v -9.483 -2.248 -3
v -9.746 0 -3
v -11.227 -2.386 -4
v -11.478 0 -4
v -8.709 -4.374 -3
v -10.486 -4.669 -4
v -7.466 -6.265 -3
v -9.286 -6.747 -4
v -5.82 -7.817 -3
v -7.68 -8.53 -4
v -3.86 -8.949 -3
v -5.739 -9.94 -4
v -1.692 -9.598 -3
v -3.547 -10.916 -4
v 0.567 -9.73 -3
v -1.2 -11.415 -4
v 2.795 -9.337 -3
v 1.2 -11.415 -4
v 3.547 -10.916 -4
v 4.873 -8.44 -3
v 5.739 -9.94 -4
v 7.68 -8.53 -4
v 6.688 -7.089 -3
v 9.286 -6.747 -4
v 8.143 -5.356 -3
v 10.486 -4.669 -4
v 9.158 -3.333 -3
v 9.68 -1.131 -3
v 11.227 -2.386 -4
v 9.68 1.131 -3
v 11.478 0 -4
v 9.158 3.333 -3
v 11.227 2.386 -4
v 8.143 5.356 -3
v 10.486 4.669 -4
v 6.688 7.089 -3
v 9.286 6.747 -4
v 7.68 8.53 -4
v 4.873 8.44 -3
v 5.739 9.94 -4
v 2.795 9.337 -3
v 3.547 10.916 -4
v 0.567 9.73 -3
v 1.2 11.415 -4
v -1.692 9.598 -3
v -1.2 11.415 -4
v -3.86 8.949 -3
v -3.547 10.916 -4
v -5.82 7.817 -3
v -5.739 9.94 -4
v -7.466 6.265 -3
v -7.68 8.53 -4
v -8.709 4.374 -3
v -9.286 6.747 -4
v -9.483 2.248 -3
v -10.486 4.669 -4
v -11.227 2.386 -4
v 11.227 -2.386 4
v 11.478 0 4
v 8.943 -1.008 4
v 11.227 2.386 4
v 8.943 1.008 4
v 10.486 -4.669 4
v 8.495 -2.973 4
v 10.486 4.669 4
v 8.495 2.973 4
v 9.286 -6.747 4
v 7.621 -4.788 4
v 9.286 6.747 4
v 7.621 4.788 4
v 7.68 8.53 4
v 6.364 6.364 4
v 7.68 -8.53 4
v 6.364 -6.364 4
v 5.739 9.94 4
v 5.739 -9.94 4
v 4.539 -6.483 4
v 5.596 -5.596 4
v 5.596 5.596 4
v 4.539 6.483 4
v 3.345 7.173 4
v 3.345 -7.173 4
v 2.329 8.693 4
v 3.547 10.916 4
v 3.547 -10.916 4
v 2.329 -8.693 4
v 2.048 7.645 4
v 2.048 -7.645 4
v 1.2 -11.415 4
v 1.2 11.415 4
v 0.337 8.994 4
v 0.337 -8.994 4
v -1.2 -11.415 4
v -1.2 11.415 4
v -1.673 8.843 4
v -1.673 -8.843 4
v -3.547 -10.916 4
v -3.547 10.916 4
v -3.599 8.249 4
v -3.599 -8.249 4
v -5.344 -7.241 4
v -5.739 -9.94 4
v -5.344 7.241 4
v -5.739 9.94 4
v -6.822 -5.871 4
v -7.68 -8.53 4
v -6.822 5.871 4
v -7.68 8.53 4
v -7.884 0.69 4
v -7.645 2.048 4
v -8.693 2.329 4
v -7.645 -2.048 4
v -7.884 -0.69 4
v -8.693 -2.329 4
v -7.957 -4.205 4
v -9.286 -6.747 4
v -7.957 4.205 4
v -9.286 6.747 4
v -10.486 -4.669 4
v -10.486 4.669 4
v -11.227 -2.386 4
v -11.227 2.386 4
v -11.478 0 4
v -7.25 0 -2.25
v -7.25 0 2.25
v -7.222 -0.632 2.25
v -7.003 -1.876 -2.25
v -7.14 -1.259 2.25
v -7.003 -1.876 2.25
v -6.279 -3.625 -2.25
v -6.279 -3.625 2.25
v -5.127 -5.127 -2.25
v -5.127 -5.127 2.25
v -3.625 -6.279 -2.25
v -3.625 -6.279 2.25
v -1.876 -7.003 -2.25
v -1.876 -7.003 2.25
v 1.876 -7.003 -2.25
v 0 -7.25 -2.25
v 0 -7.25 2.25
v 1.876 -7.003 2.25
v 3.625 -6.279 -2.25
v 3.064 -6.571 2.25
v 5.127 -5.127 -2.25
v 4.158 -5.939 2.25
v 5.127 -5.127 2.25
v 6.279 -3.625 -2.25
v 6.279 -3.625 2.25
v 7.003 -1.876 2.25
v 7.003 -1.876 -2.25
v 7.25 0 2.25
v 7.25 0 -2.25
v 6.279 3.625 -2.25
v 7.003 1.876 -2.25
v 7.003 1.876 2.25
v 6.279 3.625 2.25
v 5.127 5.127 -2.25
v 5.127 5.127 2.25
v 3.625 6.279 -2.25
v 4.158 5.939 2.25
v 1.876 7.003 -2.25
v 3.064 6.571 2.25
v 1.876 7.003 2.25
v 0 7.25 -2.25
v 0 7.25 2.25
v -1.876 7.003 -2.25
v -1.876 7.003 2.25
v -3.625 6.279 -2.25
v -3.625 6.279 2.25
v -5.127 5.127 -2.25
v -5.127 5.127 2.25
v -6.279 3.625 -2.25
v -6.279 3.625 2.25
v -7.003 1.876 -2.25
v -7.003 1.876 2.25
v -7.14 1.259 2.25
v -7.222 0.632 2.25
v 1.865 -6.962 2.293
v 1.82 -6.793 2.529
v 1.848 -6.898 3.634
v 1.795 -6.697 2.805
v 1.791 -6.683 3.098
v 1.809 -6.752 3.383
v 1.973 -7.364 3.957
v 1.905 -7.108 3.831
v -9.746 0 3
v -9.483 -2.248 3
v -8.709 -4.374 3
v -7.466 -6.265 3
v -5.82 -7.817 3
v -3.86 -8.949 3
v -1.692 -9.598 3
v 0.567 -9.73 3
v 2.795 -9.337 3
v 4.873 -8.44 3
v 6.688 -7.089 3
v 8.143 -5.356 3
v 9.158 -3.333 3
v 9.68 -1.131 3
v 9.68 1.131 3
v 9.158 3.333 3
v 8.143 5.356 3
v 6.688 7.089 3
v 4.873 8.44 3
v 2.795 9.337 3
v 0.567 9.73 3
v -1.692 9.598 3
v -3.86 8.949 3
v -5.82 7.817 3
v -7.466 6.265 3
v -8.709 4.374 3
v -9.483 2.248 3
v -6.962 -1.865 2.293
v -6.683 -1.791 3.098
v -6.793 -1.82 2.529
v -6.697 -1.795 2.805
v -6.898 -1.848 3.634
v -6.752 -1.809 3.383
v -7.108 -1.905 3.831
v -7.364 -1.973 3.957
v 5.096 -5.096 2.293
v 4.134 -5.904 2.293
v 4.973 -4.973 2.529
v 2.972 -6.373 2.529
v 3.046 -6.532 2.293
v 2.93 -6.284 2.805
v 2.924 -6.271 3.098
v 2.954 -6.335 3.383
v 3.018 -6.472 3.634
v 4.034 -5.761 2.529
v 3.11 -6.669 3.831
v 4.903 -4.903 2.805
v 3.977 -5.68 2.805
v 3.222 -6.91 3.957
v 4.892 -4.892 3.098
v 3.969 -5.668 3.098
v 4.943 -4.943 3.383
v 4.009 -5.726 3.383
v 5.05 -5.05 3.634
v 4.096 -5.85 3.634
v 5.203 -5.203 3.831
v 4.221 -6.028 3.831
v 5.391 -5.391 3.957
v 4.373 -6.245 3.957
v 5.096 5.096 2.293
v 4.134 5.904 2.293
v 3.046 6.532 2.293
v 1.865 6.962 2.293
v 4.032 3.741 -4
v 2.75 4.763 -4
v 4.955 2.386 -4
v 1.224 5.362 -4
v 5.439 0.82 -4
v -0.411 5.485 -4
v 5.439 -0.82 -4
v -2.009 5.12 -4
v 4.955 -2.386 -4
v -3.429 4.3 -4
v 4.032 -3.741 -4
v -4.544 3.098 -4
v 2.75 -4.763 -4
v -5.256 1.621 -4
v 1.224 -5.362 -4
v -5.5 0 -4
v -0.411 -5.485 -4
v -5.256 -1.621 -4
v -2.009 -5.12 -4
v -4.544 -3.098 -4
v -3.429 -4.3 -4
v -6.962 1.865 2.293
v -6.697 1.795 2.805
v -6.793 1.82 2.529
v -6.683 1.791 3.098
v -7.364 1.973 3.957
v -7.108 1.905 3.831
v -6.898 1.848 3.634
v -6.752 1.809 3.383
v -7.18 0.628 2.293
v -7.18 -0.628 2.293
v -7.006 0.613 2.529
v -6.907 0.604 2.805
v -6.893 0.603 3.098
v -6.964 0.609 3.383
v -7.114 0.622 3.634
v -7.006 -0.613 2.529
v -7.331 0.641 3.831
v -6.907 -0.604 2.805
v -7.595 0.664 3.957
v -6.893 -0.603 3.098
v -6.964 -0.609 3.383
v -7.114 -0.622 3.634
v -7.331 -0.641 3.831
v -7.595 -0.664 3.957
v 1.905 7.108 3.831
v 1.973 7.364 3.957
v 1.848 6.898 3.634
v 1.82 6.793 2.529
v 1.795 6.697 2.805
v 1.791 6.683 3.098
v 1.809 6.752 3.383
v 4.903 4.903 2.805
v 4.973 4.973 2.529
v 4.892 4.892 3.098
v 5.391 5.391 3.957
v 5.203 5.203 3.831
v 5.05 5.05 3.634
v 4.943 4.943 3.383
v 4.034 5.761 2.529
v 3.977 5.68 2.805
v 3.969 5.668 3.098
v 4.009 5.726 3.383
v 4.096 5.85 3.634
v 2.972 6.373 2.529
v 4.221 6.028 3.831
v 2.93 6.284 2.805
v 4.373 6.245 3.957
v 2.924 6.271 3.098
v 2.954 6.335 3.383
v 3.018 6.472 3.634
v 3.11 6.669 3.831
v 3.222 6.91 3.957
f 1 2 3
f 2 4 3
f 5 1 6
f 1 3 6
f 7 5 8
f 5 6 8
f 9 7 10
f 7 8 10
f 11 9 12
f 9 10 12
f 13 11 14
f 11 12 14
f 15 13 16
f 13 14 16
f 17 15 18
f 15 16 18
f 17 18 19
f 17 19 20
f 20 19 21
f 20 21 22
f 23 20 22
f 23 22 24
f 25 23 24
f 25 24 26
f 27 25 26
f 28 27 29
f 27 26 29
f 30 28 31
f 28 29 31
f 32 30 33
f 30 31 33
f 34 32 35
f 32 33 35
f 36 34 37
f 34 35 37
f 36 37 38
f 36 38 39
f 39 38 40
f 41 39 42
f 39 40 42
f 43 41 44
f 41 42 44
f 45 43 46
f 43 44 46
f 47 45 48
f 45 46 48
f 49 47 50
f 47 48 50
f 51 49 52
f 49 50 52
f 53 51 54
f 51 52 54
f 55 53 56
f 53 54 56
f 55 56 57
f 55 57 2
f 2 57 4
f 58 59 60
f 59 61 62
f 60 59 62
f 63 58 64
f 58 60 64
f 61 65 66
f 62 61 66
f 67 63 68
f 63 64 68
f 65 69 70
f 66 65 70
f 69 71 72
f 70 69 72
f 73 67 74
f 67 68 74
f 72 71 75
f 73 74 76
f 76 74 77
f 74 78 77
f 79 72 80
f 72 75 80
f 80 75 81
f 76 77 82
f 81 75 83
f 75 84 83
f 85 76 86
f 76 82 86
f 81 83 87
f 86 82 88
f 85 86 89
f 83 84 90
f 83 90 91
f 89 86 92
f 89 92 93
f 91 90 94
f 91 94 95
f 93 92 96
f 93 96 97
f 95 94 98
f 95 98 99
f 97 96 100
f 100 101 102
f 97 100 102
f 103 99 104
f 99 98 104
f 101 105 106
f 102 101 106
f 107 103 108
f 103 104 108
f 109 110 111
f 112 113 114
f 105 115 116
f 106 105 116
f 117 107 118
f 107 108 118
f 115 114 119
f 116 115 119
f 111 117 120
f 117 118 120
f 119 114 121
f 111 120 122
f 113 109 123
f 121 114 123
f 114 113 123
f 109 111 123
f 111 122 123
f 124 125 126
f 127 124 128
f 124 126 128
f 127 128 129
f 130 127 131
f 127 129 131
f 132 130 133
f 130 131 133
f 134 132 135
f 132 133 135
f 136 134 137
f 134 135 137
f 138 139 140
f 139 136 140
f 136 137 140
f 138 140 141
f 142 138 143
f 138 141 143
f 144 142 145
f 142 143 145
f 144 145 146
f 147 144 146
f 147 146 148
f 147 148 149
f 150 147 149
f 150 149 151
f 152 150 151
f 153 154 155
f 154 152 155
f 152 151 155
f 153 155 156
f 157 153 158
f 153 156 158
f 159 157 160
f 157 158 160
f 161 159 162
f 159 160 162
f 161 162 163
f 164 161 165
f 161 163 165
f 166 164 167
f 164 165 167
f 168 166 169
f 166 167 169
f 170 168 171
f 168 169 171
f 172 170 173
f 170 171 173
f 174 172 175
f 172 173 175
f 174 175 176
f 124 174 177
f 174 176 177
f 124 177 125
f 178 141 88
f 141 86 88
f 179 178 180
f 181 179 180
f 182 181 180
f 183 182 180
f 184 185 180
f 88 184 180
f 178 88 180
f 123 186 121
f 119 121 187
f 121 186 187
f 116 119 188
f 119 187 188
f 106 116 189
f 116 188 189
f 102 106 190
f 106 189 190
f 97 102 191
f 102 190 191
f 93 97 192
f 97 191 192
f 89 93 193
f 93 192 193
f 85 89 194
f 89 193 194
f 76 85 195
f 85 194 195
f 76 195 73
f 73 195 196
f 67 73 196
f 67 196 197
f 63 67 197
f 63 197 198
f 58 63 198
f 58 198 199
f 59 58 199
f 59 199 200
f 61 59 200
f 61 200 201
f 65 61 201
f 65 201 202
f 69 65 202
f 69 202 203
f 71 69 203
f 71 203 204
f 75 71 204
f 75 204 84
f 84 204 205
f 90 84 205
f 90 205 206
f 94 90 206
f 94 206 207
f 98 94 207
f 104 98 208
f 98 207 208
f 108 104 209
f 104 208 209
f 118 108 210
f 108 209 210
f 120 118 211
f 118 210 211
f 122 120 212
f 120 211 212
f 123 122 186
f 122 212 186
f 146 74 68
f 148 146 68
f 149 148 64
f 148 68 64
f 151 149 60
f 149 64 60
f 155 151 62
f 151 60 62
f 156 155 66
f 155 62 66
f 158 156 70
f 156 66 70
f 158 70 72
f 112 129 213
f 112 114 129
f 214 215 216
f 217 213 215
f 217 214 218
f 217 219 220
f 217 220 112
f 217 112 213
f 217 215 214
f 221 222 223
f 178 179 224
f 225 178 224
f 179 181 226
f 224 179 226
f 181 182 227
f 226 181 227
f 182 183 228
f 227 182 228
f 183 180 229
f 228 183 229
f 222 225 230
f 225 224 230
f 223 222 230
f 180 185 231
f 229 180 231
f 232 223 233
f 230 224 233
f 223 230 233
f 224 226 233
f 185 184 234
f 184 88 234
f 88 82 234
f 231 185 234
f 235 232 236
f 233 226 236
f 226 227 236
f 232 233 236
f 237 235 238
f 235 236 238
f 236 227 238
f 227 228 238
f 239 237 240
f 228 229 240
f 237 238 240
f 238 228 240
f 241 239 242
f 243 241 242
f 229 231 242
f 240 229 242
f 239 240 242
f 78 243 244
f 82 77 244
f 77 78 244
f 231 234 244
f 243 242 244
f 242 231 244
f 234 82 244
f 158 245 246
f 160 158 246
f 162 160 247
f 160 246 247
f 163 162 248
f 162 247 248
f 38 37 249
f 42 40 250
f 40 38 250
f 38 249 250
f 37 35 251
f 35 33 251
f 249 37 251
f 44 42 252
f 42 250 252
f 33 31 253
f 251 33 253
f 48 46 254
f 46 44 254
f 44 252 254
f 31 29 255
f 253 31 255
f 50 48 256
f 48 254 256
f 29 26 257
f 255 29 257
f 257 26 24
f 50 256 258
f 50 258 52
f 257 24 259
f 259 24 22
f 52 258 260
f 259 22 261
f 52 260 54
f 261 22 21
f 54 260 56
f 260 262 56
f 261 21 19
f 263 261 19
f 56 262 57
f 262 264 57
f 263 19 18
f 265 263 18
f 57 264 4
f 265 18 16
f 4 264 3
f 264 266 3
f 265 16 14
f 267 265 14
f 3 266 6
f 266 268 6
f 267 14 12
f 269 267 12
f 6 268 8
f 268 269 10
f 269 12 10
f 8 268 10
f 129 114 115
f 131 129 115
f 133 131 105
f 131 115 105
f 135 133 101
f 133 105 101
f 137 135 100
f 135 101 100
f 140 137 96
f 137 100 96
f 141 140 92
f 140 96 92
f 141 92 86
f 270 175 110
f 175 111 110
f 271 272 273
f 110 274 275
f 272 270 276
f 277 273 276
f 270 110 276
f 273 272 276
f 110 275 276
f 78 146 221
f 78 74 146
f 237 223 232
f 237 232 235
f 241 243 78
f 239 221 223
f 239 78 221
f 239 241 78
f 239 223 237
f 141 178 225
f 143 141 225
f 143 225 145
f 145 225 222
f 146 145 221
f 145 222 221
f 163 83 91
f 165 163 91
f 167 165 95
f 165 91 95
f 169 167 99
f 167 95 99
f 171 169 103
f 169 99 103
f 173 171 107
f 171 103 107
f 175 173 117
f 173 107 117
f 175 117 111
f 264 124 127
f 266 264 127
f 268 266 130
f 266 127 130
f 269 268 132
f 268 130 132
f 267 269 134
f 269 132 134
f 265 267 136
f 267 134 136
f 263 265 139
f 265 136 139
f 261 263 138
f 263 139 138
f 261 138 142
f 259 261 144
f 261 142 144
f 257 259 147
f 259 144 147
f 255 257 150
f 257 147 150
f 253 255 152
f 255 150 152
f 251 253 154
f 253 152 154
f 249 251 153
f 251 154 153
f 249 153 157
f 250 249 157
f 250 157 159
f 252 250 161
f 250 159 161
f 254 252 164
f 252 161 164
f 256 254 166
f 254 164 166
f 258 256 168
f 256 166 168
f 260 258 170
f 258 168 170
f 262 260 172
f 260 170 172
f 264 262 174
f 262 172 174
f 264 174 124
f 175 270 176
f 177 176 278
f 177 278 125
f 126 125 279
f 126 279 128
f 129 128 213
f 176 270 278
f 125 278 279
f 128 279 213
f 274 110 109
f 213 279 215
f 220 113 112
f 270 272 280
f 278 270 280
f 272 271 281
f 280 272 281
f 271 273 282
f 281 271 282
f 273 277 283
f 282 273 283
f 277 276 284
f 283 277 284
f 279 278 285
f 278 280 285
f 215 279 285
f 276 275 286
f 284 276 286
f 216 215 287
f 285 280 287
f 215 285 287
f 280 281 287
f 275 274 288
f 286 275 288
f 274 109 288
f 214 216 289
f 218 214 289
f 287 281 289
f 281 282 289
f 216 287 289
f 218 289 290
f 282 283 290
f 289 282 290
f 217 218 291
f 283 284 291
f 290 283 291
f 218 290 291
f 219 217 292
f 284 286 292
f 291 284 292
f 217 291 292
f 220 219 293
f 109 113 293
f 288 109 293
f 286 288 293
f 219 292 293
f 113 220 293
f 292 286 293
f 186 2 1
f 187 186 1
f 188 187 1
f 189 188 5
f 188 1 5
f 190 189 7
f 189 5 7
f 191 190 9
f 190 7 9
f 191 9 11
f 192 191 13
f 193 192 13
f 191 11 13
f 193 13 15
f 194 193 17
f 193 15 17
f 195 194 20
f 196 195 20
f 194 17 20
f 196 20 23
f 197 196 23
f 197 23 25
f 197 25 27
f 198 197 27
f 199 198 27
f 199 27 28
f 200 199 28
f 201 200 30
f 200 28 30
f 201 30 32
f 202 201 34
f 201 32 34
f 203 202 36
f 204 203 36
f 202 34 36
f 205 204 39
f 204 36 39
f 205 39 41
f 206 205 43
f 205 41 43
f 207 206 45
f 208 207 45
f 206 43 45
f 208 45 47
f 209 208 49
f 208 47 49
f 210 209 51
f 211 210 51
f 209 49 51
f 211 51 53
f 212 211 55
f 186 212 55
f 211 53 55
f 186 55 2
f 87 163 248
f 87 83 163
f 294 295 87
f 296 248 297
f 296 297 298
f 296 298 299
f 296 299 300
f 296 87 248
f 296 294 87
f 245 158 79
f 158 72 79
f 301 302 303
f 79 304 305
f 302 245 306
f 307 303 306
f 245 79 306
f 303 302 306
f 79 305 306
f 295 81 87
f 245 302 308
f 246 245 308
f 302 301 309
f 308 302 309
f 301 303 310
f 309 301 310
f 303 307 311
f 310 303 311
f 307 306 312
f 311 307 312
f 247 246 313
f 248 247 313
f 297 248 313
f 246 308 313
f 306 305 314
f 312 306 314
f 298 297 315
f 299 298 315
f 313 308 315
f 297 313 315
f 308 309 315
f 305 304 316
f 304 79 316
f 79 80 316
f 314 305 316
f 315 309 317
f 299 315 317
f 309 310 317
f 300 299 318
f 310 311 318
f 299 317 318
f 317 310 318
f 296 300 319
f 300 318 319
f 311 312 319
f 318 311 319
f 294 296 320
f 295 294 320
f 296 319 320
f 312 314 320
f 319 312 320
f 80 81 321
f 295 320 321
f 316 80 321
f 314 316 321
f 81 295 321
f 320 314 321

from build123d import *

# Parameters (mm, degrees)
F2_ANGLE_BACK = 15
F2_ANGLE      = 30
F3_COUNT      = 3
F4_R          = 1


with BuildPart() as f1:
    # F0 (on Front) → F1 (revolve)
    with BuildSketch(Plane.XZ):
        Polygon((-7.25, -2.25), (-7.25, 2.25), (-9, 4), (-11.4780508076, 4), (-9.746, 3), (-9.746, -3), (-11.4780508076, -4), (-5.5, -4), align=None)
    revolve(axis=Axis((0, 0, 0), (0, 0, 1)))

    # F0 (on Front) → F2 (revolve)
    with BuildSketch(Plane.XZ, mode=Mode.PRIVATE) as f2_sk:
        Polygon((-9, 4), (-7.25, 2.25), (-5.5, 4), align=None)
    revolve(f2_sk.sketch.rotate(Axis((0, 0, 0), (0, 0, 1)), -F2_ANGLE_BACK), axis=Axis((0, 0, 0), (0, 0, 1)), revolution_arc=F2_ANGLE)

    # F3: F1 ×3 about axis
    f3_axis = Axis((0, 0, 0), (0, 0, 1))


with BuildPart() as f1_1:
    add(f1.part)
    for i in range(1, F3_COUNT):
        add(f1.part.rotate(f3_axis, i * 360 / F3_COUNT))

    # F4
    f4_edges = [f1_1.edges().sort_by_distance(p)[0] for p in [
        (2.75, 4.76314, 4),
        (-5.5, 0, 4),
        (2.75, -4.76314, 4),
    ]]
    fillet(f4_edges, radius=F4_R)


solid = f1_1.part
